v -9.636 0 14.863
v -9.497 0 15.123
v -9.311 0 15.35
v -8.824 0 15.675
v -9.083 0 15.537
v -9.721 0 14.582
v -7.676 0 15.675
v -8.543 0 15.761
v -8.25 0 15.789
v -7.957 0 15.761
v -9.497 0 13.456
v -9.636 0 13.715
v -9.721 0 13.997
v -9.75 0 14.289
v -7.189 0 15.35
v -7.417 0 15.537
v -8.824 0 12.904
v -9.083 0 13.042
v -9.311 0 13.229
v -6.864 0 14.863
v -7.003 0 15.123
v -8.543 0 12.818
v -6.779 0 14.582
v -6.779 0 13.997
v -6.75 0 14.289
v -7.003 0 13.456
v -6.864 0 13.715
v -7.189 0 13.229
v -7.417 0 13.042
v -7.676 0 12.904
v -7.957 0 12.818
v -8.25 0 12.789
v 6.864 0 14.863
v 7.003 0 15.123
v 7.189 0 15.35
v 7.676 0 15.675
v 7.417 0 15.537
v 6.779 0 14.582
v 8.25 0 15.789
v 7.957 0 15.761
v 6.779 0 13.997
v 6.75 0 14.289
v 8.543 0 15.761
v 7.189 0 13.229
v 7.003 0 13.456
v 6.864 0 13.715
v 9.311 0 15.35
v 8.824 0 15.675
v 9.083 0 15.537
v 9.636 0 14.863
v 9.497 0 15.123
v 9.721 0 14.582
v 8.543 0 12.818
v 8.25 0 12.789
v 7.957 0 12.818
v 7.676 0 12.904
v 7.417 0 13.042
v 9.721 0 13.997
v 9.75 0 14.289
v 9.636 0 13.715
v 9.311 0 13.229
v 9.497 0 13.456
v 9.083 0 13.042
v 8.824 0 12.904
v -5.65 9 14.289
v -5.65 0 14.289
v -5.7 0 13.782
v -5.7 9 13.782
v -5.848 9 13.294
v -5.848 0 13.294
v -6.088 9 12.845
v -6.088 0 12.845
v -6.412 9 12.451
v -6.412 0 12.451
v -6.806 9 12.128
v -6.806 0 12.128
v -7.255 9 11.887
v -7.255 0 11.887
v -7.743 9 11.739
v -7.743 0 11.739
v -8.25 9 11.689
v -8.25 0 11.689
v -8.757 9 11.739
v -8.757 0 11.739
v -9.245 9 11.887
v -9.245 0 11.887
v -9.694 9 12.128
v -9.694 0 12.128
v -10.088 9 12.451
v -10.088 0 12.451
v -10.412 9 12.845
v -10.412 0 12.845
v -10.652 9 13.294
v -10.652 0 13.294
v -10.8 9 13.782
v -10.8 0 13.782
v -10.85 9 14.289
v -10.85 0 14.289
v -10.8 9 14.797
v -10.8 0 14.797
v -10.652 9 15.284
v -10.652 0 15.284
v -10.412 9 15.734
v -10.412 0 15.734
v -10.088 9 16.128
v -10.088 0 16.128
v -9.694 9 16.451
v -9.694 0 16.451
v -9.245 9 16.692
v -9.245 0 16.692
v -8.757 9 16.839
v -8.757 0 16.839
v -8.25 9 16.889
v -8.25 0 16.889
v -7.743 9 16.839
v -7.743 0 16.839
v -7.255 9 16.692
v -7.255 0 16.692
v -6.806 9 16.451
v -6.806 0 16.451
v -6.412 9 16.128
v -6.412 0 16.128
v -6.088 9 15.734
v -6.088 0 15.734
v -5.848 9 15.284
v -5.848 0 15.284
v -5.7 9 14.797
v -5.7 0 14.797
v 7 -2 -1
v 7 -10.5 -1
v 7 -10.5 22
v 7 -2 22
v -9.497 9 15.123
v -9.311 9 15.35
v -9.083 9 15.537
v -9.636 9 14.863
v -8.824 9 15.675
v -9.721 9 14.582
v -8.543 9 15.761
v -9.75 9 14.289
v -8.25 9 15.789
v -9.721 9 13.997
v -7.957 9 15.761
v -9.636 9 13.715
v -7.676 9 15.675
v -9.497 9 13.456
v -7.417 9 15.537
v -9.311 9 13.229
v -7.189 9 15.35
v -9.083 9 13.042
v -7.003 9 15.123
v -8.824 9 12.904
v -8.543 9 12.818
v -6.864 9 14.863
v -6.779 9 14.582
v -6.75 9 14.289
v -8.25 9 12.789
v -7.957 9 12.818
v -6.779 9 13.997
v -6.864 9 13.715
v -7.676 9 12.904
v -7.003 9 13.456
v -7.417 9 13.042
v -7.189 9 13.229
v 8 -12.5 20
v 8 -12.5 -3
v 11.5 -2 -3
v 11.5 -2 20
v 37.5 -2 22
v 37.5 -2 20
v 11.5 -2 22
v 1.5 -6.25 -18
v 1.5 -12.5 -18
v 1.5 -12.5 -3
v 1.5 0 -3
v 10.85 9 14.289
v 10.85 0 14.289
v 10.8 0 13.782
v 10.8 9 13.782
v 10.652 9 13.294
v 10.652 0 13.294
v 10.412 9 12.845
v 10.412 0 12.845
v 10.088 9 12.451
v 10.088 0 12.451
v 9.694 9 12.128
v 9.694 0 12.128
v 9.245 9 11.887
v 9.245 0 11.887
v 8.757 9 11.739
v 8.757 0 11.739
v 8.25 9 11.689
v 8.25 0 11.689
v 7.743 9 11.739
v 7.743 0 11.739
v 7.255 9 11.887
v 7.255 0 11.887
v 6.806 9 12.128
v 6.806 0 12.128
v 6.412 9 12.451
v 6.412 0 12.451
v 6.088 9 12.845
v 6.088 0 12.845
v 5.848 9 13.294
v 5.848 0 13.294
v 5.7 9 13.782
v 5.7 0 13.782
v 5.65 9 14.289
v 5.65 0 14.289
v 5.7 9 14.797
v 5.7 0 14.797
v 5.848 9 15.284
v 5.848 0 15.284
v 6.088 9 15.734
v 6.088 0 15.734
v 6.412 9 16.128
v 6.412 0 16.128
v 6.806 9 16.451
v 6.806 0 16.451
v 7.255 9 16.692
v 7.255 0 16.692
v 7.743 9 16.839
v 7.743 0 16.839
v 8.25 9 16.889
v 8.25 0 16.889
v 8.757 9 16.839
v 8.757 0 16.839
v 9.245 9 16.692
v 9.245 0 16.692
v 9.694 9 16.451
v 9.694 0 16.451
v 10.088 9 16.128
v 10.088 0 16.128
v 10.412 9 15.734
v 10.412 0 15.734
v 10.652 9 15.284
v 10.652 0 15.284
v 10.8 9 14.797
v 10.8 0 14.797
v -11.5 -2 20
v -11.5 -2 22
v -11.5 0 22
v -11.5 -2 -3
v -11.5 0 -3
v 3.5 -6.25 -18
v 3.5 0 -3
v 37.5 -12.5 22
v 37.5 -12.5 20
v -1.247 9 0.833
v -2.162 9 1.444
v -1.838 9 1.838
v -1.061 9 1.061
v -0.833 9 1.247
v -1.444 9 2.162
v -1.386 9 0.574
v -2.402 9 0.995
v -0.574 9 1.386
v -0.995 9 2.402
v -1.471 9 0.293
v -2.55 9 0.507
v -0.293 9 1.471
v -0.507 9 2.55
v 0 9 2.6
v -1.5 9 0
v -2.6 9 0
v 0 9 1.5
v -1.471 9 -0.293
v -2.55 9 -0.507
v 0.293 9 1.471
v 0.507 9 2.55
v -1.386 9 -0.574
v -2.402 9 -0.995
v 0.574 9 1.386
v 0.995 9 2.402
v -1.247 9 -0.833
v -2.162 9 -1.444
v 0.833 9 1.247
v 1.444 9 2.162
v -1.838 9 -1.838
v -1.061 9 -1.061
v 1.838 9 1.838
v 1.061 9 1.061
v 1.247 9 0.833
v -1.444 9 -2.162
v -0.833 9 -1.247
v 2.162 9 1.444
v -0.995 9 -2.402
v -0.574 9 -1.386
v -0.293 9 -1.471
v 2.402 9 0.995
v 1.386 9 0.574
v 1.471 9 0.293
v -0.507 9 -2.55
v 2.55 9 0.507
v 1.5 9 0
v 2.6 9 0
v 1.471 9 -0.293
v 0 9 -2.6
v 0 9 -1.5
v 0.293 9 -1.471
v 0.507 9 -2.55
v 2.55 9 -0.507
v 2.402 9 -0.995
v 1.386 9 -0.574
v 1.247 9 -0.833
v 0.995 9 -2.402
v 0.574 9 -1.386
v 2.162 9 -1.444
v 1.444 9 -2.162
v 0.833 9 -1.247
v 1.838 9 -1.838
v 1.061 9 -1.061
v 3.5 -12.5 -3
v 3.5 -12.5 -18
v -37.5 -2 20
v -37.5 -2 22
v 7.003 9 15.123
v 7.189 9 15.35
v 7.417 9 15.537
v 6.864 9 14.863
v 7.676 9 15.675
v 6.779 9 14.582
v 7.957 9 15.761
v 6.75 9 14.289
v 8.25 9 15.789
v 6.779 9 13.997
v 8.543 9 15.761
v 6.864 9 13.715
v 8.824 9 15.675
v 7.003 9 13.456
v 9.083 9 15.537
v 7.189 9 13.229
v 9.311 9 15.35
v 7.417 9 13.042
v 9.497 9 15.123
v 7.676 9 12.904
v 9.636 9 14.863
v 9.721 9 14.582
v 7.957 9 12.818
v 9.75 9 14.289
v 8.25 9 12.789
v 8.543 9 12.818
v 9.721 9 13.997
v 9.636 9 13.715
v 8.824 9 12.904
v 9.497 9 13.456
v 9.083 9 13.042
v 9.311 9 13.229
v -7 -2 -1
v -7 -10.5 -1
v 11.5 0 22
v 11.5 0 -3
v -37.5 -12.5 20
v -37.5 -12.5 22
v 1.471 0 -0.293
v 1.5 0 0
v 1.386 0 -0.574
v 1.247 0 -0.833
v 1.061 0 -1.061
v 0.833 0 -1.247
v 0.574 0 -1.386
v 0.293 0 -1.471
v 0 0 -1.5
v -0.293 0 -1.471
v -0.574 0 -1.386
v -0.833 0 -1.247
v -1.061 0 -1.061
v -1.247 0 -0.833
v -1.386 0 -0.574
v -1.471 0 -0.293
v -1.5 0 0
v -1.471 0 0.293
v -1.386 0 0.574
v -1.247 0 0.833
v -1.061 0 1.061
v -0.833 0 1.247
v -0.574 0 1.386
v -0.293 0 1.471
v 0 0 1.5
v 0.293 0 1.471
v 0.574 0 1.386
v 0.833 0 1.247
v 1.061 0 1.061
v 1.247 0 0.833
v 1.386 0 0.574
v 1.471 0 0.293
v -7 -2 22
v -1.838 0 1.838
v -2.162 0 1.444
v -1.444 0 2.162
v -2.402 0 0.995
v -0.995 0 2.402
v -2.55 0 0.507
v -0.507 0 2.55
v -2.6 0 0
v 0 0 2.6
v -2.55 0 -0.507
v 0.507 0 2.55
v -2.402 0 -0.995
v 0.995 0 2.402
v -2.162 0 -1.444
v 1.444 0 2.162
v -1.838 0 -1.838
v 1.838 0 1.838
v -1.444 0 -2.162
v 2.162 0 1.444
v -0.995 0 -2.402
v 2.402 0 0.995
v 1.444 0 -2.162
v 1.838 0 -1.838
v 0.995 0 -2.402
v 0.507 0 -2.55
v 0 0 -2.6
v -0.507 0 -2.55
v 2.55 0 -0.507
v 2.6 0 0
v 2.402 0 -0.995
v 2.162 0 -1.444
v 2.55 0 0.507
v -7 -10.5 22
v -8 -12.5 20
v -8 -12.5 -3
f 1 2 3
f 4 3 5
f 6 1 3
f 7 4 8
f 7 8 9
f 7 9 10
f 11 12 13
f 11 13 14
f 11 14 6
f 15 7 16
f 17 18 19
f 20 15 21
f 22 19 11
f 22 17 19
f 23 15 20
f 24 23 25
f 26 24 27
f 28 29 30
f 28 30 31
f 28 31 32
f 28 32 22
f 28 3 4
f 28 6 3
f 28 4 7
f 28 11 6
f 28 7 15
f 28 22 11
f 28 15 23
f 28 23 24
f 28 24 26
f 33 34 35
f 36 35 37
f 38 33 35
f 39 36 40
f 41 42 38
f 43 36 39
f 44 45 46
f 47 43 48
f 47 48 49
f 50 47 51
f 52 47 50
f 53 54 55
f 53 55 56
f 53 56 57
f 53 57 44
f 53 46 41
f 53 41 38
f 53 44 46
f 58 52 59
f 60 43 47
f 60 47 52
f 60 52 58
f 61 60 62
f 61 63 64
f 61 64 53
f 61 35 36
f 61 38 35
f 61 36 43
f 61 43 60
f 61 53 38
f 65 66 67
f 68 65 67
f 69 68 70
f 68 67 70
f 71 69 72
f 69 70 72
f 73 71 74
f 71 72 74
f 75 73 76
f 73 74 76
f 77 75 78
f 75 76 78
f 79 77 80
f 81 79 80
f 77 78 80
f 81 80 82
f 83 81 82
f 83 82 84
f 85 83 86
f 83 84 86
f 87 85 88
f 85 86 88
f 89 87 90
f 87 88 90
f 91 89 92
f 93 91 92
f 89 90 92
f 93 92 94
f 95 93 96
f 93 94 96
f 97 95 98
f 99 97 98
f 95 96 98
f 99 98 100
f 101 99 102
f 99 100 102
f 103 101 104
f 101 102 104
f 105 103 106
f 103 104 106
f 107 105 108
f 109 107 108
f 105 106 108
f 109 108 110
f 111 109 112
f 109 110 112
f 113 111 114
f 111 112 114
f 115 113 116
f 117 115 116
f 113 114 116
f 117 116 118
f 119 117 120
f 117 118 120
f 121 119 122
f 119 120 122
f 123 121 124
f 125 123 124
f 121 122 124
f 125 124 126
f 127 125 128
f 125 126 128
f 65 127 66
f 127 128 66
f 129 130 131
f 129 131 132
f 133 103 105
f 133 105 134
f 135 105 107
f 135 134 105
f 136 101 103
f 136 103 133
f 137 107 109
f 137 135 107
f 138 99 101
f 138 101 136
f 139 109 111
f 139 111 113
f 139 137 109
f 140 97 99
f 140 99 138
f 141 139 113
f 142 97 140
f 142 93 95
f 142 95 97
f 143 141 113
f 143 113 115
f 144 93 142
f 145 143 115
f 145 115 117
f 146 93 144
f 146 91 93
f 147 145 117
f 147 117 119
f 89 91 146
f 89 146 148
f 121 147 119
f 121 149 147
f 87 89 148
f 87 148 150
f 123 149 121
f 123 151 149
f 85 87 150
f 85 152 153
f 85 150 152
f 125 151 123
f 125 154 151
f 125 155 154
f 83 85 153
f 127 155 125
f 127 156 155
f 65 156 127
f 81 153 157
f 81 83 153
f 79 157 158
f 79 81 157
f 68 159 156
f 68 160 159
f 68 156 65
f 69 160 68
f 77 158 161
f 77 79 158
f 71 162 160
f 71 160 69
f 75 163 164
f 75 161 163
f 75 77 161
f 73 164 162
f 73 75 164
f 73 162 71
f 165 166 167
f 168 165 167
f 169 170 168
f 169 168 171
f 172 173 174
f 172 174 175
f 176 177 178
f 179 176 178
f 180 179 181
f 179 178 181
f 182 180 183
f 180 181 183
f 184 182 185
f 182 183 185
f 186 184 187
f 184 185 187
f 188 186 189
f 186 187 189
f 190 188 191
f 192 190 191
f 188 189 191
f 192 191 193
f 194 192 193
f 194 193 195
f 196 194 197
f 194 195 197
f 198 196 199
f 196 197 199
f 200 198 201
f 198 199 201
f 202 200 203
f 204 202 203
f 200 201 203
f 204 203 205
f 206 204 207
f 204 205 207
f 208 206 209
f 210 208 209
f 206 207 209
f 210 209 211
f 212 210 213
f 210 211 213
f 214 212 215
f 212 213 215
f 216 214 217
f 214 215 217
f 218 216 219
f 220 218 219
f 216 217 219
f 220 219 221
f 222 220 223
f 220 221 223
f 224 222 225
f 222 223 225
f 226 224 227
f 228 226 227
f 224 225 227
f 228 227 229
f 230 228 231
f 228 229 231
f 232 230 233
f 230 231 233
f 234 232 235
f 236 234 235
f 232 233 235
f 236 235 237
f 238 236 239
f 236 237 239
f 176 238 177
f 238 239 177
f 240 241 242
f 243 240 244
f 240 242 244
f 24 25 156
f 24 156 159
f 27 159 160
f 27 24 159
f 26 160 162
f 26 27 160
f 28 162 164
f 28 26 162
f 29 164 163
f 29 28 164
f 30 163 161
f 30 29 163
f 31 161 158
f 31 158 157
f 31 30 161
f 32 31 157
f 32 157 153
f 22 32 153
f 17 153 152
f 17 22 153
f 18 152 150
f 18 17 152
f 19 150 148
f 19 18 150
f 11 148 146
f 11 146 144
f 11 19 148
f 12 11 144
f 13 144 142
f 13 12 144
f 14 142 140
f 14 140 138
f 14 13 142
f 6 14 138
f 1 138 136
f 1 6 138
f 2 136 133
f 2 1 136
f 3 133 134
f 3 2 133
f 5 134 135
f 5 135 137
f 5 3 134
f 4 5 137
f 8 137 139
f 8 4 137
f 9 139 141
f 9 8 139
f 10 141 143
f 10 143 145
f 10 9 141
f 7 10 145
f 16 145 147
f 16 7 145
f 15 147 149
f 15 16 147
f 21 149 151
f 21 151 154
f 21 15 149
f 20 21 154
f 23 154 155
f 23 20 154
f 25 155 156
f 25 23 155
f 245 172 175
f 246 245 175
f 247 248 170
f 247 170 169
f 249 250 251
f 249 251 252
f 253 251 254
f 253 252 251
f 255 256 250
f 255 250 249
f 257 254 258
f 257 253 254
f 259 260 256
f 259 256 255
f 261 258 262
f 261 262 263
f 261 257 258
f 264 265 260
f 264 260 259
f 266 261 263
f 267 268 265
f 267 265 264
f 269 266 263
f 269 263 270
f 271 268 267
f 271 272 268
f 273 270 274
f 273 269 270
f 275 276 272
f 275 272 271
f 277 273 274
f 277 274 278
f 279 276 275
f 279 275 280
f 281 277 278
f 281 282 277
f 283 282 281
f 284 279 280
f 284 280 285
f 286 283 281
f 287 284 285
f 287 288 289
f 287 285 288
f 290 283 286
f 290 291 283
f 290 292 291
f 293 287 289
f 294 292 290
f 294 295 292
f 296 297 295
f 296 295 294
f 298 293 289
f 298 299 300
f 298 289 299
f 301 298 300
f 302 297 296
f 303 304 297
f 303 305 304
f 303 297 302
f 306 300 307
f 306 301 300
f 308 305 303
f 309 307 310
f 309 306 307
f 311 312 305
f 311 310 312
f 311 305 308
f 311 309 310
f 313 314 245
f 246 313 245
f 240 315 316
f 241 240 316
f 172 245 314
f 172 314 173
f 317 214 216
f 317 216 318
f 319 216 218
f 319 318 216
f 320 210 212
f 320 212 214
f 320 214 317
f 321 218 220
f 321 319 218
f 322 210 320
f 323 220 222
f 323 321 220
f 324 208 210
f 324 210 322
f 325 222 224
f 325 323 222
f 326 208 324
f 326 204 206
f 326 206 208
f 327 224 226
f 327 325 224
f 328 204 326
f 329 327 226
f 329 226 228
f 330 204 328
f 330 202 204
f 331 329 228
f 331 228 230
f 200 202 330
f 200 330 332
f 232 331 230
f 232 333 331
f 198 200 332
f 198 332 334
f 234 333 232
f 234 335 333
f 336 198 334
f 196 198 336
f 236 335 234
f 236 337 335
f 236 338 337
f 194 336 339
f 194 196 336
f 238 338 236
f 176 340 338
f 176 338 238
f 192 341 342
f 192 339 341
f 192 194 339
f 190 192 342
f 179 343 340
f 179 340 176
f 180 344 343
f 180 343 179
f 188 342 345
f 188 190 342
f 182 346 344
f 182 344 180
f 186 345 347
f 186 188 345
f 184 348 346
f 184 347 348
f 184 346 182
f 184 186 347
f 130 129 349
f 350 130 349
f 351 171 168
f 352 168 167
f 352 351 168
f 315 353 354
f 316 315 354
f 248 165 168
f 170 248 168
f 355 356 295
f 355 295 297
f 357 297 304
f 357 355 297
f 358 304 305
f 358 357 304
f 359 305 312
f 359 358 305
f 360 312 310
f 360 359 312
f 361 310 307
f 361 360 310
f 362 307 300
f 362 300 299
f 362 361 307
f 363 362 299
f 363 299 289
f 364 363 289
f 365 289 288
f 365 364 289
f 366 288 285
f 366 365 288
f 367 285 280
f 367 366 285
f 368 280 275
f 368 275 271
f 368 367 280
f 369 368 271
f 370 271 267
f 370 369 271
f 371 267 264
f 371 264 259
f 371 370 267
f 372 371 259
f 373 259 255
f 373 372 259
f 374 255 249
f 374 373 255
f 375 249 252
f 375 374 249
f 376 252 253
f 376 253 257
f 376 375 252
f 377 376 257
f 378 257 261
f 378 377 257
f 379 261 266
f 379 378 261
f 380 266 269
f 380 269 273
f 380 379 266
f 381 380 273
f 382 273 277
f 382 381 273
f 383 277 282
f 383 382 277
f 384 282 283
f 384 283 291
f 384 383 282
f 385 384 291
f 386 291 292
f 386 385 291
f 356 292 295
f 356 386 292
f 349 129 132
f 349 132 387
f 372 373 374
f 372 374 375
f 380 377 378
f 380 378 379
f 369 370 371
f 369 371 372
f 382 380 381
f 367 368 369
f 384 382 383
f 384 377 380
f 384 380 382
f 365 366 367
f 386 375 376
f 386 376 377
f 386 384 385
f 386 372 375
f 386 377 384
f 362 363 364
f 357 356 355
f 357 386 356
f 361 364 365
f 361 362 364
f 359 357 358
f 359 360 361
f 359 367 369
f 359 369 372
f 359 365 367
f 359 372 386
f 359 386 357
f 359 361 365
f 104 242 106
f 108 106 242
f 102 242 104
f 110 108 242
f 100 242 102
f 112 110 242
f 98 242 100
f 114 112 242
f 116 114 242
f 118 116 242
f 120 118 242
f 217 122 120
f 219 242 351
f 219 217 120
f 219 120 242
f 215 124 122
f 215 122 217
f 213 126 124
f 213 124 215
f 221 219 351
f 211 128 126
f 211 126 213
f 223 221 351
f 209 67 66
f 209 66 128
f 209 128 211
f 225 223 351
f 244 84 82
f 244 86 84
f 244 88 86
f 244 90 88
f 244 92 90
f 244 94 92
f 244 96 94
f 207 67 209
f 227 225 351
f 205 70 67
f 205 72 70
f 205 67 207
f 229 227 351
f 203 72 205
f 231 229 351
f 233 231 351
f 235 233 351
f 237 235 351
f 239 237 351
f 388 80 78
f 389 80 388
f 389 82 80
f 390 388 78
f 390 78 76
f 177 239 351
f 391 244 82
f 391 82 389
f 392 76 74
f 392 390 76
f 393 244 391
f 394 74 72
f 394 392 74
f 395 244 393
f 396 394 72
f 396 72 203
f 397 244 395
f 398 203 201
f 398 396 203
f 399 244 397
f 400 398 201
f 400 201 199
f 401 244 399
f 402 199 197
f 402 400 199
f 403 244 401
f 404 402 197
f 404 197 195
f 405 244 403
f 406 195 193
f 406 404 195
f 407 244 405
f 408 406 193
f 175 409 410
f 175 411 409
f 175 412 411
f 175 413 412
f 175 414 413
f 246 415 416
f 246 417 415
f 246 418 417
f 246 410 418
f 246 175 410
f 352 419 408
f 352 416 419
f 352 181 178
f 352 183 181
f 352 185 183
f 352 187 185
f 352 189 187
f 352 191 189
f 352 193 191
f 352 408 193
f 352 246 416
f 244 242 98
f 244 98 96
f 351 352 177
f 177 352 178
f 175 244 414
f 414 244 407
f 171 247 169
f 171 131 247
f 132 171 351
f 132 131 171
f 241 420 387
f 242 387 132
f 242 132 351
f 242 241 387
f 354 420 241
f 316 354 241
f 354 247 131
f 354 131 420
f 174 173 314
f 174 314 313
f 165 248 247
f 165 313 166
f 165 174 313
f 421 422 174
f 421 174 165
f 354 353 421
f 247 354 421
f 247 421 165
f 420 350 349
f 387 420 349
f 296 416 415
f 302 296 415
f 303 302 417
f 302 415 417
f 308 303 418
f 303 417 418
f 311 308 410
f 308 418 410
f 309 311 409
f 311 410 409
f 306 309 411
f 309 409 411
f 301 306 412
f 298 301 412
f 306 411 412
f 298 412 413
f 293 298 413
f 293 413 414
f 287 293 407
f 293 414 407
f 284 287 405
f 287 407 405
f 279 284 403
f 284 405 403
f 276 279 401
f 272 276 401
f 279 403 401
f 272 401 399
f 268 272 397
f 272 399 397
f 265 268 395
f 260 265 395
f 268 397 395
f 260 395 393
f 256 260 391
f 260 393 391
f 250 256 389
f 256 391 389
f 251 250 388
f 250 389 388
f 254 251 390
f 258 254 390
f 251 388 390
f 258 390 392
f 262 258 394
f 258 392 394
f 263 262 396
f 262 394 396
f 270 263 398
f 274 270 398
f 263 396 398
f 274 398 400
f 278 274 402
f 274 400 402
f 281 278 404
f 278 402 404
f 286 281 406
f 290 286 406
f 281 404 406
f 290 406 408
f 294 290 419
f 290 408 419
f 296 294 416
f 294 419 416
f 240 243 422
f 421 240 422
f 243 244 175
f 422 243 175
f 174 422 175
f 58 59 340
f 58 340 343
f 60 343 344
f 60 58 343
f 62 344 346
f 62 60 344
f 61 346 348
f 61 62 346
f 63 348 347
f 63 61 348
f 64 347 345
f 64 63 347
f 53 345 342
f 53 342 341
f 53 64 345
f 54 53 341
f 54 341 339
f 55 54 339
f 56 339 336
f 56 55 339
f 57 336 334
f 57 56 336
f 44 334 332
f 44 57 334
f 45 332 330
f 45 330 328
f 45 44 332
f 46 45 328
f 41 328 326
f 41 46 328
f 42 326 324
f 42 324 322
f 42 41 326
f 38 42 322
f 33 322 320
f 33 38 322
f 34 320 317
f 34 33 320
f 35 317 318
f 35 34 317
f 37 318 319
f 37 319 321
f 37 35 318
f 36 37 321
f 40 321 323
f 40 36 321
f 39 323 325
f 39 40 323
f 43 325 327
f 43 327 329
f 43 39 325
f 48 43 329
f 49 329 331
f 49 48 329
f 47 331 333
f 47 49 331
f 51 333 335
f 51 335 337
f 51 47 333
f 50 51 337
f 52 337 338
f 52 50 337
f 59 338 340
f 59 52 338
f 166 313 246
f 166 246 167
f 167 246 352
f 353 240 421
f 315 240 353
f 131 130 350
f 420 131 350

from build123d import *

# Parameters (mm, degrees)
SKETCH1_R             = 2.6
SKETCH1_R_2           = 1.5
BOSS_EXTRUDE1_DEPTH   = 9
BOSS_EXTRUDE1_2_DEPTH = 9
BOSS_EXTRUDE1_3_DEPTH = 9
SKETCH2_W             = 23
SKETCH2_H             = 25
BOSS_EXTRUDE2_DEPTH   = 12.5
CUT_EXTRUDE1_START    = -2
SKETCH3_W             = 14
SKETCH3_H             = 8.5
CUT_EXTRUDE1_DEPTH    = 24
BOSS_EXTRUDE3_START   = 11.5
SKETCH4_W             = 2
SKETCH4_H             = 10.5
BOSS_EXTRUDE3_DEPTH   = 26
BOSS_EXTRUDE4_START   = -11.5
SKETCH4_2_W           = 2
SKETCH4_2_H           = 10.5
BOSS_EXTRUDE4_DEPTH   = 26
SKETCH5_W             = 2
SKETCH5_H             = 12.5
BOSS_EXTRUDE5_DEPTH   = 15
CUT_EXTRUDE2_DEPTH    = 23
CUT_EXTRUDE3_DEPTH    = 2


with BuildPart() as part:
    # Sketch1 → Boss-Extrude1 (new body)
    with BuildSketch(Plane(origin=(0, 0, 0), x_dir=(1, 0, 0), z_dir=(0, 1, 0))):
        with Locations((-8.25, -14.289419162)):
            Circle(SKETCH1_R)
        with Locations((-8.25, -14.289419162)):
            Circle(SKETCH1_R_2, mode=Mode.SUBTRACT)
    extrude(amount=BOSS_EXTRUDE1_DEPTH)



with BuildPart() as body_2:
    # Sketch1 → Boss-Extrude1 2 (new body)
    with BuildSketch(Plane(origin=(0, 0, 0), x_dir=(1, 0, 0), z_dir=(0, 1, 0))):
        Circle(SKETCH1_R)
        Circle(SKETCH1_R_2, mode=Mode.SUBTRACT)
    extrude(amount=BOSS_EXTRUDE1_2_DEPTH)


with BuildPart() as body_3:
    # Sketch1 → Boss-Extrude1 3 (new body)
    with BuildSketch(Plane(origin=(0, 0, 0), x_dir=(1, 0, 0), z_dir=(0, 1, 0))):
        with Locations((8.25, -14.289419162)):
            Circle(SKETCH1_R)
        with Locations((8.25, -14.289419162)):
            Circle(SKETCH1_R_2, mode=Mode.SUBTRACT)
    extrude(amount=BOSS_EXTRUDE1_3_DEPTH)


with BuildPart() as part_1:
    add(part.part)

    add(body_2.part)  # Boss-Extrude2 merges body 2

    add(body_3.part)  # Boss-Extrude2 merges body 3
    # Sketch2 → Boss-Extrude2 (add)
    with BuildSketch(Plane(origin=(0, 0, 0), x_dir=(1, 0, 0), z_dir=(0, 1, 0))):
        with Locations((0, -9.5)):
            Rectangle(SKETCH2_W, SKETCH2_H)
    extrude(amount=-BOSS_EXTRUDE2_DEPTH)

    # Sketch3 → Cut-Extrude1 (cut, through all)
    with BuildSketch(Plane(origin=(0, 0, -3), x_dir=(-1, 0, 0), z_dir=(0, 0, -1)).offset(CUT_EXTRUDE1_START)):
        with Locations((0, -6.25)):
            Rectangle(SKETCH3_W, SKETCH3_H)
    extrude(amount=-CUT_EXTRUDE1_DEPTH, mode=Mode.SUBTRACT)

    # Sketch4 → Boss-Extrude3 (add)
    with BuildSketch(Plane.ZY.offset(BOSS_EXTRUDE3_START)):
        with Locations((21, -7.25)):
            Rectangle(SKETCH4_W, SKETCH4_H)
    extrude(amount=BOSS_EXTRUDE3_DEPTH)

    # Sketch4<2> → Boss-Extrude4 (add)
    with BuildSketch(Plane.ZY.offset(BOSS_EXTRUDE4_START)):
        with Locations((21, -7.25)):
            Rectangle(SKETCH4_2_W, SKETCH4_2_H)
    extrude(amount=-BOSS_EXTRUDE4_DEPTH)

    # Sketch5 → Boss-Extrude5 (add)
    with BuildSketch(Plane(origin=(0, 0, -3), x_dir=(-1, 0, 0), z_dir=(0, 0, -1))):
        with Locations((-2.5, -6.25)):
            Rectangle(SKETCH5_W, SKETCH5_H)
    extrude(amount=BOSS_EXTRUDE5_DEPTH)

    # Sketch6 → Cut-Extrude2 (cut)
    with BuildSketch(Plane.XY.offset(-3)):
        Polygon((-11.5, -2), (-8, -12.5), (-11.5, -12.5), align=None)
        Polygon((11.5, -2), (11.5, -12.5), (8, -12.5), align=None)
    extrude(amount=CUT_EXTRUDE2_DEPTH, mode=Mode.SUBTRACT)

    # Sketch7 → Cut-Extrude3 (cut)
    with BuildSketch(Plane.ZY.offset(-1.5)):
        Polygon((-18, 0), (-18, -6.25), (-3, 0), align=None)
    extrude(amount=-CUT_EXTRUDE3_DEPTH, mode=Mode.SUBTRACT)


solid = part_1.part
